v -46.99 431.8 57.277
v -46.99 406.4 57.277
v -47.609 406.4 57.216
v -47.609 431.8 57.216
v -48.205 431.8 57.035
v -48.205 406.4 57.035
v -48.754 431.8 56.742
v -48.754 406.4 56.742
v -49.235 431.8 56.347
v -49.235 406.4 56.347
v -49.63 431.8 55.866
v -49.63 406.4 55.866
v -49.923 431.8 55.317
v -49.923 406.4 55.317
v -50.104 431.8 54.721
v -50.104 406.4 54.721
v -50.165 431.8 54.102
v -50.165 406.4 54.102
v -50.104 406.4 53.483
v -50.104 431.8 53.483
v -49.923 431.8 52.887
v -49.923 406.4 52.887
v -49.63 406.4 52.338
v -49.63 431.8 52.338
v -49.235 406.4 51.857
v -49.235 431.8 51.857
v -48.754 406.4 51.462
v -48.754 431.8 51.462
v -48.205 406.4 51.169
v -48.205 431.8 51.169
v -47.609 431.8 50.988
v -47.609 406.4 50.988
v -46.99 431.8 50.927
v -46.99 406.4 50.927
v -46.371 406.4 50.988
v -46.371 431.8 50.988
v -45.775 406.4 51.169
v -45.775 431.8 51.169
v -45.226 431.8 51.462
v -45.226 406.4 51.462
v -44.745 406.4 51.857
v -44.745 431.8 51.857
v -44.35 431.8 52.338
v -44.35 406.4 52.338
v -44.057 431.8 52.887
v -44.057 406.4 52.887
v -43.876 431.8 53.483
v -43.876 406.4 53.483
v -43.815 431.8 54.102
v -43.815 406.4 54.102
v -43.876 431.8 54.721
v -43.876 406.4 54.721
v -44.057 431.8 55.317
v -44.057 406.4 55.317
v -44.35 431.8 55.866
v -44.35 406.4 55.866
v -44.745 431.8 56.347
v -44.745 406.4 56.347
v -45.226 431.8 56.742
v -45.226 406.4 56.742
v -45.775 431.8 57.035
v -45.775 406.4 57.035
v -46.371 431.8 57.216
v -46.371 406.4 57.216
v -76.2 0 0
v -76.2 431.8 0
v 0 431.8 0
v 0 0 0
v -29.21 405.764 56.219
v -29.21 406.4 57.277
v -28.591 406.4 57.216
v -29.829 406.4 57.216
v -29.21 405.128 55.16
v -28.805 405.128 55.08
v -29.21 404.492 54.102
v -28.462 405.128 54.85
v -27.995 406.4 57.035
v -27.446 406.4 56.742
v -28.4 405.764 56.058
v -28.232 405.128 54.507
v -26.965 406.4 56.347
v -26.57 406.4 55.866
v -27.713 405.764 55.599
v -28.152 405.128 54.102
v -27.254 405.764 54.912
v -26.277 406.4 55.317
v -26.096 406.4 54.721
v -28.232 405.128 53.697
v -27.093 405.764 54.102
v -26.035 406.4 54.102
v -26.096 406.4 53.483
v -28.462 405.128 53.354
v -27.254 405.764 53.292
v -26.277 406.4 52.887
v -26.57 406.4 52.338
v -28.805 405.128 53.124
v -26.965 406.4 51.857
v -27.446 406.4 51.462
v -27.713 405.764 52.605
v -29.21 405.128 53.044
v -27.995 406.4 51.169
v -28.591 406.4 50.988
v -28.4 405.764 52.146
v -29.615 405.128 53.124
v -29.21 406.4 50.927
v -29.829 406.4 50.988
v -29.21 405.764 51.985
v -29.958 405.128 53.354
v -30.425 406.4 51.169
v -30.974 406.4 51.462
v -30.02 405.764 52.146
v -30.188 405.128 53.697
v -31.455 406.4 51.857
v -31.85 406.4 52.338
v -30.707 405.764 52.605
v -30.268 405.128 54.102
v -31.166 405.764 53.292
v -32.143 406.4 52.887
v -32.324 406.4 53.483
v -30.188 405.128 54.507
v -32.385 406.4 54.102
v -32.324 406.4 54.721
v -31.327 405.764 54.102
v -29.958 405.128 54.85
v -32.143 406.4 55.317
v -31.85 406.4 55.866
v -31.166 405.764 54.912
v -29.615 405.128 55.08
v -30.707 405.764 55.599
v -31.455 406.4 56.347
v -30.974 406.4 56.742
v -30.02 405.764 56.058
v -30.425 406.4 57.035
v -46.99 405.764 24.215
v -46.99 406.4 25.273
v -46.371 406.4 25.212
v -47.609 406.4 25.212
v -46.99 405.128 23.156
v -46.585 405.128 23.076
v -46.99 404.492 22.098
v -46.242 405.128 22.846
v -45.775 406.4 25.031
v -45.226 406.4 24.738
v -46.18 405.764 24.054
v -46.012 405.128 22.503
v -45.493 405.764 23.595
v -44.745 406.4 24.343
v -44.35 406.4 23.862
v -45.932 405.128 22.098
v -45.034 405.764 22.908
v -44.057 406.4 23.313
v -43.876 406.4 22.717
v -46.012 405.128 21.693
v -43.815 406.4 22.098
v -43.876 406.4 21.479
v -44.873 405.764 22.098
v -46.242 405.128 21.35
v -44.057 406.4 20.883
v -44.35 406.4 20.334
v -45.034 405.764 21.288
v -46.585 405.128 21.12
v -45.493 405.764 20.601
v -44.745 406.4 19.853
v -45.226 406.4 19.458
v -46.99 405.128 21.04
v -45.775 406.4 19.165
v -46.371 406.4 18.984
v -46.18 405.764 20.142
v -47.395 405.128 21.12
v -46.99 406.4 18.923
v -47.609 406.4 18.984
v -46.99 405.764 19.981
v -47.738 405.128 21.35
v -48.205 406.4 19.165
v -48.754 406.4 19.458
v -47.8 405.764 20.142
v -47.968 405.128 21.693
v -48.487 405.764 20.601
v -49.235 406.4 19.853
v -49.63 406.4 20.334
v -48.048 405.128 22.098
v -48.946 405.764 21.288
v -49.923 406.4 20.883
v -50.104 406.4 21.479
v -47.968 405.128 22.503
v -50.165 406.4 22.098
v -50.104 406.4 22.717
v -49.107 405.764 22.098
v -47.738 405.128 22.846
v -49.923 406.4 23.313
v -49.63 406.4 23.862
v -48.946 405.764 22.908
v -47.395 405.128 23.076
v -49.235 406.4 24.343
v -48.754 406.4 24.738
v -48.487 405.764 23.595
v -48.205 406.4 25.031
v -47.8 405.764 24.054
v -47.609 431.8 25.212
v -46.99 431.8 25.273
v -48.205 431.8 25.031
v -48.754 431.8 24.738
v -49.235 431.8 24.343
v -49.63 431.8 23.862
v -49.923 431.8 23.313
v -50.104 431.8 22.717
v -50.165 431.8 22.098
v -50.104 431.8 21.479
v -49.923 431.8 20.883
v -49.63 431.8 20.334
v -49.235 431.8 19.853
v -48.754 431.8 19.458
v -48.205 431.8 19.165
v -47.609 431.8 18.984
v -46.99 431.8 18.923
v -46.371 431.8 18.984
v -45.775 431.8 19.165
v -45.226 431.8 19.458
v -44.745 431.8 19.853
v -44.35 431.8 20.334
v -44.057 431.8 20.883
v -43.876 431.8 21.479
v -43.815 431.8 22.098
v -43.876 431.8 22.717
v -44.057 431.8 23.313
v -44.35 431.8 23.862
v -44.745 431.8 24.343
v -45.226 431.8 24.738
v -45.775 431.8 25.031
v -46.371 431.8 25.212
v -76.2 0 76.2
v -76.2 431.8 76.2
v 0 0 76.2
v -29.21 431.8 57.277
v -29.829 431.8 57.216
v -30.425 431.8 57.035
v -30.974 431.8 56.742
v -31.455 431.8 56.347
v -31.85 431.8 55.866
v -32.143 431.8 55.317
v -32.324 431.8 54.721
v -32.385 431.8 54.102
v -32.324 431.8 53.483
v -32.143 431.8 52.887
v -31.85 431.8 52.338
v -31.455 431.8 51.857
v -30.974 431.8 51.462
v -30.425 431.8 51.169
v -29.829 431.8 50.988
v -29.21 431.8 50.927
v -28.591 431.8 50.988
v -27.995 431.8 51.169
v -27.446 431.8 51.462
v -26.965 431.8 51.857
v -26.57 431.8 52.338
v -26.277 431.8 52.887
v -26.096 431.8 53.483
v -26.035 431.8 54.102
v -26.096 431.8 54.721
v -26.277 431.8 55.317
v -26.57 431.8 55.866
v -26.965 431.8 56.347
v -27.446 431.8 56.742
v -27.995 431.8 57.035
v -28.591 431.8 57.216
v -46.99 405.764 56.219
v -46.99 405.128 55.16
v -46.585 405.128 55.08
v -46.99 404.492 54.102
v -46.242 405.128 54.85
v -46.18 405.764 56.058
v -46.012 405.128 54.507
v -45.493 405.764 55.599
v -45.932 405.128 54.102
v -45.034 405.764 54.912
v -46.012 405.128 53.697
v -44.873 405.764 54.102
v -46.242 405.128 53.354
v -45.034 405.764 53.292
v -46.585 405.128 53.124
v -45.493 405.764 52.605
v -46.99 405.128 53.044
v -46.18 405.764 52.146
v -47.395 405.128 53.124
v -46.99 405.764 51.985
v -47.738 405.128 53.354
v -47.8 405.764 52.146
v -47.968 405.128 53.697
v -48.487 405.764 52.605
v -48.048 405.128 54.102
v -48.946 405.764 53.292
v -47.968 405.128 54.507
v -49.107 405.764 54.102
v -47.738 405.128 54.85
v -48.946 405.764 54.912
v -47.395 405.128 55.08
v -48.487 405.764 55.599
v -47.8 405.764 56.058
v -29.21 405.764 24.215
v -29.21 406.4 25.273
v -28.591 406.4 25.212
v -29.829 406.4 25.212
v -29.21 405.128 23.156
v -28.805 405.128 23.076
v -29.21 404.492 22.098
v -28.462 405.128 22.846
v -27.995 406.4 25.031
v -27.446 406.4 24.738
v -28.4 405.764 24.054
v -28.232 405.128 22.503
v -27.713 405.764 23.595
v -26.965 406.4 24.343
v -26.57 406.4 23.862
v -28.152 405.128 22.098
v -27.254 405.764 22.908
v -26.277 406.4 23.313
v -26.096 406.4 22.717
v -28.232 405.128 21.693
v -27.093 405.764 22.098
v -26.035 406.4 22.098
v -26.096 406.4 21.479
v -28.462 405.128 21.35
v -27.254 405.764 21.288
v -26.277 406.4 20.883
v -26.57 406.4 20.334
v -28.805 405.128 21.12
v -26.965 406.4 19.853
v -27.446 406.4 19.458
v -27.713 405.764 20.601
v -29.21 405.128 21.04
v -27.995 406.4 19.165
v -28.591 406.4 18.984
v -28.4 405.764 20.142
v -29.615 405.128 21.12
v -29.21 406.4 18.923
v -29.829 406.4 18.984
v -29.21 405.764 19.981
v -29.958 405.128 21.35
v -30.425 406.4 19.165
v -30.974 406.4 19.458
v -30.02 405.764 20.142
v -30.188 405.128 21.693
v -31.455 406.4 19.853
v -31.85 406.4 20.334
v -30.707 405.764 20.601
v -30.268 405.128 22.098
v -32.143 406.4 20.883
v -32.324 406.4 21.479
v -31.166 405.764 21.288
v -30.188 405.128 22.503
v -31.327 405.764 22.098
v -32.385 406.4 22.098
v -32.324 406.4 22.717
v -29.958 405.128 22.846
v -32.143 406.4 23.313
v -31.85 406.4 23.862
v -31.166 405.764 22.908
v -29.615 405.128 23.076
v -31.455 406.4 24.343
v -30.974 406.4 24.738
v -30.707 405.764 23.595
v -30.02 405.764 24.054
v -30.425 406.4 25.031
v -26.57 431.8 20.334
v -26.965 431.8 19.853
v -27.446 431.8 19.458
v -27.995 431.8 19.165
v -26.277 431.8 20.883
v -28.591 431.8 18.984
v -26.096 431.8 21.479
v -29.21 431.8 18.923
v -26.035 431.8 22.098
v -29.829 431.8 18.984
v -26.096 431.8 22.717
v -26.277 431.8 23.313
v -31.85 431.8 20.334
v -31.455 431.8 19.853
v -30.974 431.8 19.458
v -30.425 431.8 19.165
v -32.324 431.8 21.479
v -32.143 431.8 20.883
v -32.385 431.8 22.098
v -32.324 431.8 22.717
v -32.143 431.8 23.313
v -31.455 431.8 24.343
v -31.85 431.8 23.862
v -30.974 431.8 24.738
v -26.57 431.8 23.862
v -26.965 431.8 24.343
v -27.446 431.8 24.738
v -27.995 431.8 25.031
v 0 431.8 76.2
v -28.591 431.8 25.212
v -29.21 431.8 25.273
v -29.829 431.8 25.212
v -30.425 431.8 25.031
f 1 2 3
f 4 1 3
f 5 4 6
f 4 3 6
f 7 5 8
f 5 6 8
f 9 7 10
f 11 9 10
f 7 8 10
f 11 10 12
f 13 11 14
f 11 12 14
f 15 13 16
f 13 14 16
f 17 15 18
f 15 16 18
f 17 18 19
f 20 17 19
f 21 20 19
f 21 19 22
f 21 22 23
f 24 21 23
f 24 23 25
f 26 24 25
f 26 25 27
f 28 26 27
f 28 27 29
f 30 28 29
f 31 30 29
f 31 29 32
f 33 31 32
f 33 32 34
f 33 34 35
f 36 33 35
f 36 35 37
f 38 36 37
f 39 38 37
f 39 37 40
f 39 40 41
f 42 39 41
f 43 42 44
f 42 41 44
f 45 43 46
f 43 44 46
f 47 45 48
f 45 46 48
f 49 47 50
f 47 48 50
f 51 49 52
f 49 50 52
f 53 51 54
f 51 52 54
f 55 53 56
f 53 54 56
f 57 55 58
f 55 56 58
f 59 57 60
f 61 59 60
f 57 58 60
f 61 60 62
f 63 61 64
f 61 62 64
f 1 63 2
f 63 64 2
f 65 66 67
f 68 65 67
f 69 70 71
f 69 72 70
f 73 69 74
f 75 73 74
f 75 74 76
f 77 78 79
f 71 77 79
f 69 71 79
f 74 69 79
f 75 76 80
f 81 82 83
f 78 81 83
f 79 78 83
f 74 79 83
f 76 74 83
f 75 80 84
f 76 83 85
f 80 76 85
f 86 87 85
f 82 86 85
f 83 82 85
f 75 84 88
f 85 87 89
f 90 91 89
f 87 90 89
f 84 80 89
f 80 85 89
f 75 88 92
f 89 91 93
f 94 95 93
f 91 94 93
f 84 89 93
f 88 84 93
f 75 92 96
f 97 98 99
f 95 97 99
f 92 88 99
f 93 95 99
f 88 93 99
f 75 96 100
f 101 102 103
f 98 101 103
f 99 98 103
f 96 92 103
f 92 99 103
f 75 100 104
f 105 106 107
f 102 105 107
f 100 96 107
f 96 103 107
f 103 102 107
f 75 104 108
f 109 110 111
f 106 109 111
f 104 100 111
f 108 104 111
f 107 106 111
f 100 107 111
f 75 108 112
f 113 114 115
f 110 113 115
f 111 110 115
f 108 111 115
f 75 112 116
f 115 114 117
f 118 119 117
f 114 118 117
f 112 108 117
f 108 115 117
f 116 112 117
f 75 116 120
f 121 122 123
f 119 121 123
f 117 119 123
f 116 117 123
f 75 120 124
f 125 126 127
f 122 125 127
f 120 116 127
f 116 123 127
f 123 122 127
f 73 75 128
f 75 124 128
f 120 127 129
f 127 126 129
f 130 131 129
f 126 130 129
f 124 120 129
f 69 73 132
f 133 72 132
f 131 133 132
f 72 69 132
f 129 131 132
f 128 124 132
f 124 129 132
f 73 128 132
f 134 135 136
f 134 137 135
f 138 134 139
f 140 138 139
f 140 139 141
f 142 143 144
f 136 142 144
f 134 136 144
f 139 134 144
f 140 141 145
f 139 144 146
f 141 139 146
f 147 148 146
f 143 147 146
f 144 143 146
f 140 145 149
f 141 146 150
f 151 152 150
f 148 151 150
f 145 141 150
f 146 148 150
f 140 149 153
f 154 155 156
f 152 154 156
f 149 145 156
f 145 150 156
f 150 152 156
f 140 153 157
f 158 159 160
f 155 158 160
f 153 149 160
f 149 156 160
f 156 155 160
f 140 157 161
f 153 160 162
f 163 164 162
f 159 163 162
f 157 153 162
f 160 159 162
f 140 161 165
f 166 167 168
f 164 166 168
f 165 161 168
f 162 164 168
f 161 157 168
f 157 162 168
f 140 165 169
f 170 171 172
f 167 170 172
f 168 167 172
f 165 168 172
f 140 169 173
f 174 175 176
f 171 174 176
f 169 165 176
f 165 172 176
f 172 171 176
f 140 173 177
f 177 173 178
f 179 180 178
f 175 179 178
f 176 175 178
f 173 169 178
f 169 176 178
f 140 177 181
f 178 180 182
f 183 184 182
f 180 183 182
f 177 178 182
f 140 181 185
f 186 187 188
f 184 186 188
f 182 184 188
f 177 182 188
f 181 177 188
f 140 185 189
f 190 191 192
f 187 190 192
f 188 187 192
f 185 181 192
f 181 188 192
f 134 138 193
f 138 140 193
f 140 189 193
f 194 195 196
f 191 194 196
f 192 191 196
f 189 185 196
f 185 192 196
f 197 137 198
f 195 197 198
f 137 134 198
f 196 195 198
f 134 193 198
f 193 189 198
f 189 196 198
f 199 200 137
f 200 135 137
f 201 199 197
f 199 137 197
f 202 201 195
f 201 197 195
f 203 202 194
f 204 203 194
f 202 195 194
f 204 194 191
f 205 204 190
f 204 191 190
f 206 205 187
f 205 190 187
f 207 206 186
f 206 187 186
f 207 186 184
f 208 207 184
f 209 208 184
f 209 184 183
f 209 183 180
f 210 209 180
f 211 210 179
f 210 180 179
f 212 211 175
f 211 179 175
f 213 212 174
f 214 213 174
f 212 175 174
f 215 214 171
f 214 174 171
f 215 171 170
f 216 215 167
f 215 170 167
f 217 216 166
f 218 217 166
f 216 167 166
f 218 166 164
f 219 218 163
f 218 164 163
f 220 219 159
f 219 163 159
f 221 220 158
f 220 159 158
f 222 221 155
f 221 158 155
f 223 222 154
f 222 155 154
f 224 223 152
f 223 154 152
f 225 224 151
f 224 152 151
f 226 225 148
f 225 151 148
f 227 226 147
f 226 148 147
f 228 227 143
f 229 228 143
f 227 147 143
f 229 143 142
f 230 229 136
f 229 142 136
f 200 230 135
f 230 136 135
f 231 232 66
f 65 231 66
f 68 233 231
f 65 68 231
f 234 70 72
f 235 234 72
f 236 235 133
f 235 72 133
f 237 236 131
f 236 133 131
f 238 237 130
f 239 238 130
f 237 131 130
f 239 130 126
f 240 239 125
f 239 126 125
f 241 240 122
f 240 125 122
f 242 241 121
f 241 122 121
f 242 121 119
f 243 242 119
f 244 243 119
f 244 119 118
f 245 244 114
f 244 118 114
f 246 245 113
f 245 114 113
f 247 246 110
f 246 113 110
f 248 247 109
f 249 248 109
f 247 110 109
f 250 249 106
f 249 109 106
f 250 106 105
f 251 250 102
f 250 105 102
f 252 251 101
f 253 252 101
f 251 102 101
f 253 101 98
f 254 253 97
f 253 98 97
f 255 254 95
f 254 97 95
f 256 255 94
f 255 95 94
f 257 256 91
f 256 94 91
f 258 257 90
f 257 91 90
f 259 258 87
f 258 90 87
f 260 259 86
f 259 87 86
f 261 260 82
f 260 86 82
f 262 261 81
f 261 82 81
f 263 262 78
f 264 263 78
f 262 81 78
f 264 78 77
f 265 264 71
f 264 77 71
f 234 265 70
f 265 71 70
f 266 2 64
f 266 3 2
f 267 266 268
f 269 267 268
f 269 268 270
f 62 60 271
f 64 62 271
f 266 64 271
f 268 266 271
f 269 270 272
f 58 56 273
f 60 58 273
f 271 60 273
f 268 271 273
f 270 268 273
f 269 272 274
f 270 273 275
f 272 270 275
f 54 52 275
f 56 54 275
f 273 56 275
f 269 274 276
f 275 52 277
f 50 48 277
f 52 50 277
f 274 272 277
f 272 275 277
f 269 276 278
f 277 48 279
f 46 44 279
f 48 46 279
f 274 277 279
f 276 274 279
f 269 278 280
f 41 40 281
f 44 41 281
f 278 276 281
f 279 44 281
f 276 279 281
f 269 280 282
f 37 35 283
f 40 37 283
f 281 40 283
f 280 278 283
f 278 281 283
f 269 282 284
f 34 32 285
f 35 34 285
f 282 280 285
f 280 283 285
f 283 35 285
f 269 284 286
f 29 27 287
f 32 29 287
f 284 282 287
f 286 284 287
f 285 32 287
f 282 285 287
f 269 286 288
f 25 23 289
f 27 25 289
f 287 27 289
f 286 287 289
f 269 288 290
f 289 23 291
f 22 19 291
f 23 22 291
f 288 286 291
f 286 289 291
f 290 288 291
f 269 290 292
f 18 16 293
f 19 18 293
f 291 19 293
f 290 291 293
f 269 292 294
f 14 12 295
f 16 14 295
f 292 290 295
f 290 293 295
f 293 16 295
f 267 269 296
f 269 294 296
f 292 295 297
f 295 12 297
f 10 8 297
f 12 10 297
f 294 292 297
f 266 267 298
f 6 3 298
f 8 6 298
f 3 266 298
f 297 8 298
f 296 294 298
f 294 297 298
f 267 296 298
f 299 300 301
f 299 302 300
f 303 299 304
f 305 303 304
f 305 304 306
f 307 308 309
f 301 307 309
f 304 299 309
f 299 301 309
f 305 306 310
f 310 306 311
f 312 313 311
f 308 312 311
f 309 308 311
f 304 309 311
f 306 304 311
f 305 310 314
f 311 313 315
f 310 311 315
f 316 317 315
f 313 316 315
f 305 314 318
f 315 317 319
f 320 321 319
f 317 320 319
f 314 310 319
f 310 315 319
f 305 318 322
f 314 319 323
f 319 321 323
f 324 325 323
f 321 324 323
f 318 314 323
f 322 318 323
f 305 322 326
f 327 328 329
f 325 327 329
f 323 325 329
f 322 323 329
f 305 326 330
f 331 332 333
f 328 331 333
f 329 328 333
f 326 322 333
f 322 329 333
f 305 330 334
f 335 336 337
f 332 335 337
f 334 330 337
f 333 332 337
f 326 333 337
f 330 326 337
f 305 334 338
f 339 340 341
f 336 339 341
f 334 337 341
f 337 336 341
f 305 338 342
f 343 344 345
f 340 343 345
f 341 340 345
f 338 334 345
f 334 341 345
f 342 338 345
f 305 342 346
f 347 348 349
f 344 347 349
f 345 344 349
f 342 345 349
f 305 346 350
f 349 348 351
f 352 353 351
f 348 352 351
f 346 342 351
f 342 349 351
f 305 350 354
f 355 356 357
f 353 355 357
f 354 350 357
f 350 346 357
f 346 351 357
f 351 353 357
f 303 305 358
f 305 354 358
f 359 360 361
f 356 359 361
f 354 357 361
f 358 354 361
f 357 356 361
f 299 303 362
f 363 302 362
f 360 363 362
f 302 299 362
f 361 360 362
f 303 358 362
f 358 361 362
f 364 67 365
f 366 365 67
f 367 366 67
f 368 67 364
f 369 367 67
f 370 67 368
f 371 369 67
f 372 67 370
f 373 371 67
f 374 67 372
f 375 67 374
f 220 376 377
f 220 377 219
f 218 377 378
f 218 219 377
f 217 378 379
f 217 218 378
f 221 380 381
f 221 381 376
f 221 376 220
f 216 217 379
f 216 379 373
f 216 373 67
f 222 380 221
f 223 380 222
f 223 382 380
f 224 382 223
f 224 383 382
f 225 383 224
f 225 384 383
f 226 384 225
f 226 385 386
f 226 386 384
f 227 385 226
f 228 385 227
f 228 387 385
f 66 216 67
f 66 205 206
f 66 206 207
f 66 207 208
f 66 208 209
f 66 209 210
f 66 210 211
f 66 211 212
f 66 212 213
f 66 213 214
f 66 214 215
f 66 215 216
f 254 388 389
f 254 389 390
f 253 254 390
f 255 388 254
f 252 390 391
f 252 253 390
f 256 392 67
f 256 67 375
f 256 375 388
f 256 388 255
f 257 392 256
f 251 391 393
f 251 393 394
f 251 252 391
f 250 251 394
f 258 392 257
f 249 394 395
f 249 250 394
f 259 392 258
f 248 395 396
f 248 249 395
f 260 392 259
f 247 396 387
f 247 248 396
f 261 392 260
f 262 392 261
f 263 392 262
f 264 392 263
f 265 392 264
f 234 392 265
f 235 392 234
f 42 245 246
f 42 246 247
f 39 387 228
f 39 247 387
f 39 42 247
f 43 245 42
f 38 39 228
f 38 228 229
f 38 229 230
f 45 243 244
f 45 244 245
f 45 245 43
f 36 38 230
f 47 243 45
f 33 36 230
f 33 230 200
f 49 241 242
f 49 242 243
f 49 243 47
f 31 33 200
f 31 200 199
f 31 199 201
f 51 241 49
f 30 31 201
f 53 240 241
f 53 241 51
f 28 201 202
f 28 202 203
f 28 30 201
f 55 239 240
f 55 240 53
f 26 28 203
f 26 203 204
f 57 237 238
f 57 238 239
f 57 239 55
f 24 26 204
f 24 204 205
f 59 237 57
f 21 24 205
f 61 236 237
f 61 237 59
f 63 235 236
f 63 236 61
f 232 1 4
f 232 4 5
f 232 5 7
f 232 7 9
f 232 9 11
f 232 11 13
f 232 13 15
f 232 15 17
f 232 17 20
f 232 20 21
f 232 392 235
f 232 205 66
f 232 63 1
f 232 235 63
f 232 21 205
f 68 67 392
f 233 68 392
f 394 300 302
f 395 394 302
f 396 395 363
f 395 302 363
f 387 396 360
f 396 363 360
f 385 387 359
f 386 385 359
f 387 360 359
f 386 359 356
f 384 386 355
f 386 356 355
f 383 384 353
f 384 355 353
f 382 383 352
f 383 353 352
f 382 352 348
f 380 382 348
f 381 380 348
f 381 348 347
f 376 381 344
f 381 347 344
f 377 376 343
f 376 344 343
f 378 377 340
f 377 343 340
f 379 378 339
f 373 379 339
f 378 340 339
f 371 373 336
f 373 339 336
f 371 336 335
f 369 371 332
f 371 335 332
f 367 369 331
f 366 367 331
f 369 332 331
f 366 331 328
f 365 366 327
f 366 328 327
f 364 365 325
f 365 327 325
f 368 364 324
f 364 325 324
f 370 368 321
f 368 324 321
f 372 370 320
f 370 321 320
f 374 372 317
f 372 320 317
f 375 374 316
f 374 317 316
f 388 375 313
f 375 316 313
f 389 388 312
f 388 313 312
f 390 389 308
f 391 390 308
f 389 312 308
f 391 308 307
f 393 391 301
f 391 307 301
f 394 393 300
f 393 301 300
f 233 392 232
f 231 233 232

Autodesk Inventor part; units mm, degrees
ref_plane "YZ Plane" through (0, 0, 0) normal (1, 0, 0) x (0, 1, 0)
ref_plane "XZ Plane" through (0, 0, 0) normal (0, 1, 0) x (-1, 0, 0)
ref_plane "XY Plane" through (0, 0, 0) normal (0, 0, 1) x (1, 0, 0)
sketch "Sketch1" plane through (0, 0, 0) normal (0, 1, 0) x (-1, 0, 0)
  line L0 (0, 0) -> (0, 76.2)
  line L1 (0, 76.2) -> (76.2, 76.2)
  line L2 (76.2, 76.2) -> (76.2, 0)
  line L3 (76.2, 0) -> (0, 0)
  dimension "d0" = 76.2
  dimension "d1" = 76.2
extrude "Extrusion1" add sketch "Sketch1" along normal blind 431.8
sketch "Sketch2" plane through (0, 431.8, 0) normal (0, 1, 0) x (1, 0, 0)
  line L0 (-76.2, -76.2) -> (0, -76.2) projected
  line L1 (-76.2, 0) -> (-76.2, -76.2) projected
  line L2 (0, 0) -> (-76.2, 0) projected
  line L3 (0, -76.2) -> (0, 0) projected
  line L4 (0, -38.1) -> (-76.2, -38.1) construction
  line L5 (-38.1, -38.1) -> (-38.1, -22.098) construction
  line L6 (-38.1, -22.098) -> (-46.99, -22.098) construction
  circle A0 centre (-46.99, -22.098) radius 2.032
  circle A1 centre (-29.21, -22.098) radius 2.032
  circle A2 centre (-46.99, -54.102) radius 2.032
  circle A3 centre (-29.21, -54.102) radius 2.032
  dimension "d4" = 16.002
  dimension "d5" = 8.89
  dimension "d6" = 4.064
hole "Hole1" at (-46.99, 431.8, 54.102) at (-29.21, 431.8, 54.102) at (-29.21, 431.8, 22.098) at (-46.99, 431.8, 22.098) direction (0, -1, 0) diameter 6.35 depth 25.4 tip angle 118
properties part number "tower"
